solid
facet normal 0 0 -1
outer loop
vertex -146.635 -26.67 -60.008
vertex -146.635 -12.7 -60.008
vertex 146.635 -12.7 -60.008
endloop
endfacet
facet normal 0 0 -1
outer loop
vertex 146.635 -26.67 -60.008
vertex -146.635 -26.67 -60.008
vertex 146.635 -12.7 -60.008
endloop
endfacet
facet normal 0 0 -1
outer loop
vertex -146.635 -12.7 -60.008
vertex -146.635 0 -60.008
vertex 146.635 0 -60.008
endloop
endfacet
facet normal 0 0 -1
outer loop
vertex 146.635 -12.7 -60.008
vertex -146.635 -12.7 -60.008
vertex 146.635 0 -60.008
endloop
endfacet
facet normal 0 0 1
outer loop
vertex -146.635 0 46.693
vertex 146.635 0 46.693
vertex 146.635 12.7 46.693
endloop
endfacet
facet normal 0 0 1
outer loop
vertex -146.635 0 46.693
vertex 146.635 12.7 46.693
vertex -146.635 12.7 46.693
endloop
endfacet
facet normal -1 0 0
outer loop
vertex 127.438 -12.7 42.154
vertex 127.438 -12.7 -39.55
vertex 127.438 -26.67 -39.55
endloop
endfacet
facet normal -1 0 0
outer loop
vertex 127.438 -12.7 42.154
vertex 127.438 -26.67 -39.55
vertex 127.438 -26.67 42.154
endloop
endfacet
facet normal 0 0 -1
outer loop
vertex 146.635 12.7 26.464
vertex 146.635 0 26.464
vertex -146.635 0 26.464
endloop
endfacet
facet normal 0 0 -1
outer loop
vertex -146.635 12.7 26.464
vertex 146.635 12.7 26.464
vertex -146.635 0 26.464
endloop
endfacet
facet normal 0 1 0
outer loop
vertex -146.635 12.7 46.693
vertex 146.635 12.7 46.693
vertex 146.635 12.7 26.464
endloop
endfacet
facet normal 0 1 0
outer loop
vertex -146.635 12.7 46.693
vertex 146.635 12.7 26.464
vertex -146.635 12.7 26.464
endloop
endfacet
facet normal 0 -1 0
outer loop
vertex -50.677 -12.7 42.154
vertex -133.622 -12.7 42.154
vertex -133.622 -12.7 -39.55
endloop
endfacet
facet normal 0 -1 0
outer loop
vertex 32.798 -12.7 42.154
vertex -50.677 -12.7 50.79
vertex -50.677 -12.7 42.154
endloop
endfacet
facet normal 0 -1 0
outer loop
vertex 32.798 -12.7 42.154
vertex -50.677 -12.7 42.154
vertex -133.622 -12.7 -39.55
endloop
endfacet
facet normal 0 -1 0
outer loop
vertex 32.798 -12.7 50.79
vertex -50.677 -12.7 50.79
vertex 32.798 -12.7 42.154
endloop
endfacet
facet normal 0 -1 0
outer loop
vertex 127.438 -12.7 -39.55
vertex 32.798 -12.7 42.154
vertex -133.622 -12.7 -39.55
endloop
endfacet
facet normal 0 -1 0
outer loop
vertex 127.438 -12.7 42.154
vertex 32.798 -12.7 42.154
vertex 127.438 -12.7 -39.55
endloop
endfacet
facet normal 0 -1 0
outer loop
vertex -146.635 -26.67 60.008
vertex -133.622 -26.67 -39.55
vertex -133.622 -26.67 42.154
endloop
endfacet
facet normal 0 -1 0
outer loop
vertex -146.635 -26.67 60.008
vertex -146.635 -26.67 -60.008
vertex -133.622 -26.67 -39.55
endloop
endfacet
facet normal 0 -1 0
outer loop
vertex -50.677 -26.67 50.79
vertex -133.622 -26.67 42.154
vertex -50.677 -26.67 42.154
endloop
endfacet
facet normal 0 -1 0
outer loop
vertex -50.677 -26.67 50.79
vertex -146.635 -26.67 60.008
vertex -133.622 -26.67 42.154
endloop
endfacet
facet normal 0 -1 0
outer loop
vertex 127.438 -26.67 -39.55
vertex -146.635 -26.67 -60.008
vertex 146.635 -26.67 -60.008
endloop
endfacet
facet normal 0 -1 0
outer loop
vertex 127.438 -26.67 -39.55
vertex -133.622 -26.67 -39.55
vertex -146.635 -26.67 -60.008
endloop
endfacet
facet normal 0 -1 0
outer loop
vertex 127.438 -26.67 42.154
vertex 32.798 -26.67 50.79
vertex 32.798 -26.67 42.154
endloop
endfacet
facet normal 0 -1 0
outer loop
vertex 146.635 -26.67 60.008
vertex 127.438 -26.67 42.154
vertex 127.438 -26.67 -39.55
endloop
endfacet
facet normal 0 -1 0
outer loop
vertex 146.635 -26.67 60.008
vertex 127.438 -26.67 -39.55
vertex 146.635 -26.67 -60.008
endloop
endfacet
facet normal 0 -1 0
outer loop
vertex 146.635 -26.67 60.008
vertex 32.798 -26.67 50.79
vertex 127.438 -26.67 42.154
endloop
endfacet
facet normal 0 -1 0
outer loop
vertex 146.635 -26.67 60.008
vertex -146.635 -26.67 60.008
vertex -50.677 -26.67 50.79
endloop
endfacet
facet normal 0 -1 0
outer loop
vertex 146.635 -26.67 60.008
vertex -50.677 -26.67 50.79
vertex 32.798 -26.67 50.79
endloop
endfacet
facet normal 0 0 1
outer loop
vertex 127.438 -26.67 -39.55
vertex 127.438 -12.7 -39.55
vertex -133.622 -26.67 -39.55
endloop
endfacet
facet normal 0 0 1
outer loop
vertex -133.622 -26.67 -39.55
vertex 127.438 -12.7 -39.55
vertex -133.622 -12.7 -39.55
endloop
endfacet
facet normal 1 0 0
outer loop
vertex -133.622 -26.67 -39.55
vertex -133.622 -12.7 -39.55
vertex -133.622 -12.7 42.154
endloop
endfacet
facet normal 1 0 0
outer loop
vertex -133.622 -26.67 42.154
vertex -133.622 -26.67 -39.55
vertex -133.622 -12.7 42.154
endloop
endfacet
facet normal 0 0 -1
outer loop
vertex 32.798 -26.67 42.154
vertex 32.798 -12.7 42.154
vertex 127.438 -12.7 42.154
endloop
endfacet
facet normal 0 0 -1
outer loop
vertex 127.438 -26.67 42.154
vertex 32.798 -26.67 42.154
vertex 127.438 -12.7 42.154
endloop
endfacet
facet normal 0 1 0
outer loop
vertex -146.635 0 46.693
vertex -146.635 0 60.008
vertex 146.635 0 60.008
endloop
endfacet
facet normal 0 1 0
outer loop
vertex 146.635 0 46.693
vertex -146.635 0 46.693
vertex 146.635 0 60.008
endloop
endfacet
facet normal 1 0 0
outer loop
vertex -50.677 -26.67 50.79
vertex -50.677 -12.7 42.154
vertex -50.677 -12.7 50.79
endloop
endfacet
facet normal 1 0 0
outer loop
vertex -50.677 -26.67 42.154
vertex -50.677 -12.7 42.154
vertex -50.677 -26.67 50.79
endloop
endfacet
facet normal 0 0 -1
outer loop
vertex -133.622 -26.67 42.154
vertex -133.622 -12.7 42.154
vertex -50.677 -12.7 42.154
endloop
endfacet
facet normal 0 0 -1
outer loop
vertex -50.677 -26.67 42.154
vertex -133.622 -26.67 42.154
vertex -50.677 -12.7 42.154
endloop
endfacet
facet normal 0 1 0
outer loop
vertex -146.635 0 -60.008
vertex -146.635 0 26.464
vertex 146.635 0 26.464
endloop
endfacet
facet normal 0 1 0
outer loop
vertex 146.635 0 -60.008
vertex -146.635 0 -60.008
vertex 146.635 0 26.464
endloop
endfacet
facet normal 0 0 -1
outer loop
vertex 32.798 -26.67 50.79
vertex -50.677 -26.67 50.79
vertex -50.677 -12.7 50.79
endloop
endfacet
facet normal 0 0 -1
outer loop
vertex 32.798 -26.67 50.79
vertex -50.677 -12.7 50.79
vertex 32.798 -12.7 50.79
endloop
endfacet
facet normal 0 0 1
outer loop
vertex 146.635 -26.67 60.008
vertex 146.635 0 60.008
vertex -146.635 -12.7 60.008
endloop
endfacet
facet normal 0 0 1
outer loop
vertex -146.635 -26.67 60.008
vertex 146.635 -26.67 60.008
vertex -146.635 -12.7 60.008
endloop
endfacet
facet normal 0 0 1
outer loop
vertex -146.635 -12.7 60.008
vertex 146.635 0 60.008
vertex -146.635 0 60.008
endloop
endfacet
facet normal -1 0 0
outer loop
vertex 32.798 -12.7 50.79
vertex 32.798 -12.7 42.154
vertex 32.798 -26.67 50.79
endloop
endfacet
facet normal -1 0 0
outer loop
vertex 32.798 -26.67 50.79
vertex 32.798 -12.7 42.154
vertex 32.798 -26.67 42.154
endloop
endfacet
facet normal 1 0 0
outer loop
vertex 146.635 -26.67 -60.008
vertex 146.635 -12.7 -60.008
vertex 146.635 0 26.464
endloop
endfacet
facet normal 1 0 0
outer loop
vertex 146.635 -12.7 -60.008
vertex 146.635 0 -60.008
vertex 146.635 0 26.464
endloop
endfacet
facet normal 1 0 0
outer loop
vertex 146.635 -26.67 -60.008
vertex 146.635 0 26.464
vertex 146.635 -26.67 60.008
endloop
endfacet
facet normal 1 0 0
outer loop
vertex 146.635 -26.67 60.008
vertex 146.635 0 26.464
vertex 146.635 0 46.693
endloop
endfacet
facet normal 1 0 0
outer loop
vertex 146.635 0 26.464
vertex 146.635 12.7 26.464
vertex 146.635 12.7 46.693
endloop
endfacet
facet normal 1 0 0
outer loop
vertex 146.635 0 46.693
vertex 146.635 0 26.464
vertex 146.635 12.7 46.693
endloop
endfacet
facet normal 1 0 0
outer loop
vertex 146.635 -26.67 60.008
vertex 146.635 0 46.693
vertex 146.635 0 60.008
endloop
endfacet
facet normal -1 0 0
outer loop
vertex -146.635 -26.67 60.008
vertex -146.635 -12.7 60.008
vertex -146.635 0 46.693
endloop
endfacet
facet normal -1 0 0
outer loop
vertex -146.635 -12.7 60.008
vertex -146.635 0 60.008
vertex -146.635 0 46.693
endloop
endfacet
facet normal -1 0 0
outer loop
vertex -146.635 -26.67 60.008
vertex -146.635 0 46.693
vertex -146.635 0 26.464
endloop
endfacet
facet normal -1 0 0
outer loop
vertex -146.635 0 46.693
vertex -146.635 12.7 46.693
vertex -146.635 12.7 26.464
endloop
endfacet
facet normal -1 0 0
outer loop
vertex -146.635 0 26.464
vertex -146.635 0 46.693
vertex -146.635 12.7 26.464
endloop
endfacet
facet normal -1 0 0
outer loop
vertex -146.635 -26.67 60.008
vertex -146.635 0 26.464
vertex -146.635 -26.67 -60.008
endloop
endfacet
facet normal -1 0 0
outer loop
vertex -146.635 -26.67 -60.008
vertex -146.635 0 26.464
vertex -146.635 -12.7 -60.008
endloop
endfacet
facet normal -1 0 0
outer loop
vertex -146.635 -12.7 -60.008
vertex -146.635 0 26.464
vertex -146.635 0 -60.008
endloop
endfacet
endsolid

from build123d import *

# Parameters (mm, degrees)
F0_W     = 293.2697534561
F0_H     = 120.0150027871
F1_DEPTH = 12.7
F2_W     = 19.1973745823
F2_H     = 81.7032158375
F2_W_2   = 13.0126923323
F3_DEPTH = 13.97
F4_W     = 293.2697534561
F4_H     = 20.2290192246
F5_DEPTH = 12.7
F6_W     = 83.4743231535
F6_H     = 13.97
F7_DEPTH = 8.636


with BuildPart() as f1:
    # F0 (on Front) → F1 (new body)
    with BuildSketch(Plane.XZ):
        Rectangle(F0_W, F0_H)
    extrude(amount=F1_DEPTH)

    # F2 (on face) → F3 (join)
    with BuildSketch(Plane.XZ.offset(12.7)):
        Polygon((146.6348767281, 60.0075013936), (-146.6348767281, 60.0075013936), (-146.6348767281, 42.1536527574), (-133.6221843958, 42.1536527574), (127.4375021458, 42.1536527574), (146.6348767281, 42.1536527574), align=None)
        with Locations((137.0361894369, 1.3020448387)):
            Rectangle(F2_W, F2_H)
        with Locations((-140.1285305619, 1.3020448387)):
            Rectangle(F2_W_2, F2_H)
        Polygon((-133.6221843958, -39.5495630801), (-146.6348767281, -39.5495630801), (-146.6348767281, -60.0075013936), (146.6348767281, -60.0075013936), (146.6348767281, -39.5495630801), (127.4375021458, -39.5495630801), align=None)
    extrude(amount=F3_DEPTH)

    # F4 (on face) → F5 (join)
    with BuildSketch(Plane(origin=(0, 0, 0), x_dir=(-1, 0, 0), z_dir=(0, 1, 0))):
        with Locations((0, 36.5786291659)):
            Rectangle(F4_W, F4_H)
    extrude(amount=F5_DEPTH)

    # F6 (on face) → F7 (cut)
    with BuildSketch(Plane(origin=(0, 0, 42.1536527574), x_dir=(1, 0, 0), z_dir=(0, 0, -1))):
        with Locations((-8.9395232499, 19.685)):
            Rectangle(F6_W, F6_H)
    extrude(amount=-F7_DEPTH, mode=Mode.SUBTRACT)


solid = f1.part
